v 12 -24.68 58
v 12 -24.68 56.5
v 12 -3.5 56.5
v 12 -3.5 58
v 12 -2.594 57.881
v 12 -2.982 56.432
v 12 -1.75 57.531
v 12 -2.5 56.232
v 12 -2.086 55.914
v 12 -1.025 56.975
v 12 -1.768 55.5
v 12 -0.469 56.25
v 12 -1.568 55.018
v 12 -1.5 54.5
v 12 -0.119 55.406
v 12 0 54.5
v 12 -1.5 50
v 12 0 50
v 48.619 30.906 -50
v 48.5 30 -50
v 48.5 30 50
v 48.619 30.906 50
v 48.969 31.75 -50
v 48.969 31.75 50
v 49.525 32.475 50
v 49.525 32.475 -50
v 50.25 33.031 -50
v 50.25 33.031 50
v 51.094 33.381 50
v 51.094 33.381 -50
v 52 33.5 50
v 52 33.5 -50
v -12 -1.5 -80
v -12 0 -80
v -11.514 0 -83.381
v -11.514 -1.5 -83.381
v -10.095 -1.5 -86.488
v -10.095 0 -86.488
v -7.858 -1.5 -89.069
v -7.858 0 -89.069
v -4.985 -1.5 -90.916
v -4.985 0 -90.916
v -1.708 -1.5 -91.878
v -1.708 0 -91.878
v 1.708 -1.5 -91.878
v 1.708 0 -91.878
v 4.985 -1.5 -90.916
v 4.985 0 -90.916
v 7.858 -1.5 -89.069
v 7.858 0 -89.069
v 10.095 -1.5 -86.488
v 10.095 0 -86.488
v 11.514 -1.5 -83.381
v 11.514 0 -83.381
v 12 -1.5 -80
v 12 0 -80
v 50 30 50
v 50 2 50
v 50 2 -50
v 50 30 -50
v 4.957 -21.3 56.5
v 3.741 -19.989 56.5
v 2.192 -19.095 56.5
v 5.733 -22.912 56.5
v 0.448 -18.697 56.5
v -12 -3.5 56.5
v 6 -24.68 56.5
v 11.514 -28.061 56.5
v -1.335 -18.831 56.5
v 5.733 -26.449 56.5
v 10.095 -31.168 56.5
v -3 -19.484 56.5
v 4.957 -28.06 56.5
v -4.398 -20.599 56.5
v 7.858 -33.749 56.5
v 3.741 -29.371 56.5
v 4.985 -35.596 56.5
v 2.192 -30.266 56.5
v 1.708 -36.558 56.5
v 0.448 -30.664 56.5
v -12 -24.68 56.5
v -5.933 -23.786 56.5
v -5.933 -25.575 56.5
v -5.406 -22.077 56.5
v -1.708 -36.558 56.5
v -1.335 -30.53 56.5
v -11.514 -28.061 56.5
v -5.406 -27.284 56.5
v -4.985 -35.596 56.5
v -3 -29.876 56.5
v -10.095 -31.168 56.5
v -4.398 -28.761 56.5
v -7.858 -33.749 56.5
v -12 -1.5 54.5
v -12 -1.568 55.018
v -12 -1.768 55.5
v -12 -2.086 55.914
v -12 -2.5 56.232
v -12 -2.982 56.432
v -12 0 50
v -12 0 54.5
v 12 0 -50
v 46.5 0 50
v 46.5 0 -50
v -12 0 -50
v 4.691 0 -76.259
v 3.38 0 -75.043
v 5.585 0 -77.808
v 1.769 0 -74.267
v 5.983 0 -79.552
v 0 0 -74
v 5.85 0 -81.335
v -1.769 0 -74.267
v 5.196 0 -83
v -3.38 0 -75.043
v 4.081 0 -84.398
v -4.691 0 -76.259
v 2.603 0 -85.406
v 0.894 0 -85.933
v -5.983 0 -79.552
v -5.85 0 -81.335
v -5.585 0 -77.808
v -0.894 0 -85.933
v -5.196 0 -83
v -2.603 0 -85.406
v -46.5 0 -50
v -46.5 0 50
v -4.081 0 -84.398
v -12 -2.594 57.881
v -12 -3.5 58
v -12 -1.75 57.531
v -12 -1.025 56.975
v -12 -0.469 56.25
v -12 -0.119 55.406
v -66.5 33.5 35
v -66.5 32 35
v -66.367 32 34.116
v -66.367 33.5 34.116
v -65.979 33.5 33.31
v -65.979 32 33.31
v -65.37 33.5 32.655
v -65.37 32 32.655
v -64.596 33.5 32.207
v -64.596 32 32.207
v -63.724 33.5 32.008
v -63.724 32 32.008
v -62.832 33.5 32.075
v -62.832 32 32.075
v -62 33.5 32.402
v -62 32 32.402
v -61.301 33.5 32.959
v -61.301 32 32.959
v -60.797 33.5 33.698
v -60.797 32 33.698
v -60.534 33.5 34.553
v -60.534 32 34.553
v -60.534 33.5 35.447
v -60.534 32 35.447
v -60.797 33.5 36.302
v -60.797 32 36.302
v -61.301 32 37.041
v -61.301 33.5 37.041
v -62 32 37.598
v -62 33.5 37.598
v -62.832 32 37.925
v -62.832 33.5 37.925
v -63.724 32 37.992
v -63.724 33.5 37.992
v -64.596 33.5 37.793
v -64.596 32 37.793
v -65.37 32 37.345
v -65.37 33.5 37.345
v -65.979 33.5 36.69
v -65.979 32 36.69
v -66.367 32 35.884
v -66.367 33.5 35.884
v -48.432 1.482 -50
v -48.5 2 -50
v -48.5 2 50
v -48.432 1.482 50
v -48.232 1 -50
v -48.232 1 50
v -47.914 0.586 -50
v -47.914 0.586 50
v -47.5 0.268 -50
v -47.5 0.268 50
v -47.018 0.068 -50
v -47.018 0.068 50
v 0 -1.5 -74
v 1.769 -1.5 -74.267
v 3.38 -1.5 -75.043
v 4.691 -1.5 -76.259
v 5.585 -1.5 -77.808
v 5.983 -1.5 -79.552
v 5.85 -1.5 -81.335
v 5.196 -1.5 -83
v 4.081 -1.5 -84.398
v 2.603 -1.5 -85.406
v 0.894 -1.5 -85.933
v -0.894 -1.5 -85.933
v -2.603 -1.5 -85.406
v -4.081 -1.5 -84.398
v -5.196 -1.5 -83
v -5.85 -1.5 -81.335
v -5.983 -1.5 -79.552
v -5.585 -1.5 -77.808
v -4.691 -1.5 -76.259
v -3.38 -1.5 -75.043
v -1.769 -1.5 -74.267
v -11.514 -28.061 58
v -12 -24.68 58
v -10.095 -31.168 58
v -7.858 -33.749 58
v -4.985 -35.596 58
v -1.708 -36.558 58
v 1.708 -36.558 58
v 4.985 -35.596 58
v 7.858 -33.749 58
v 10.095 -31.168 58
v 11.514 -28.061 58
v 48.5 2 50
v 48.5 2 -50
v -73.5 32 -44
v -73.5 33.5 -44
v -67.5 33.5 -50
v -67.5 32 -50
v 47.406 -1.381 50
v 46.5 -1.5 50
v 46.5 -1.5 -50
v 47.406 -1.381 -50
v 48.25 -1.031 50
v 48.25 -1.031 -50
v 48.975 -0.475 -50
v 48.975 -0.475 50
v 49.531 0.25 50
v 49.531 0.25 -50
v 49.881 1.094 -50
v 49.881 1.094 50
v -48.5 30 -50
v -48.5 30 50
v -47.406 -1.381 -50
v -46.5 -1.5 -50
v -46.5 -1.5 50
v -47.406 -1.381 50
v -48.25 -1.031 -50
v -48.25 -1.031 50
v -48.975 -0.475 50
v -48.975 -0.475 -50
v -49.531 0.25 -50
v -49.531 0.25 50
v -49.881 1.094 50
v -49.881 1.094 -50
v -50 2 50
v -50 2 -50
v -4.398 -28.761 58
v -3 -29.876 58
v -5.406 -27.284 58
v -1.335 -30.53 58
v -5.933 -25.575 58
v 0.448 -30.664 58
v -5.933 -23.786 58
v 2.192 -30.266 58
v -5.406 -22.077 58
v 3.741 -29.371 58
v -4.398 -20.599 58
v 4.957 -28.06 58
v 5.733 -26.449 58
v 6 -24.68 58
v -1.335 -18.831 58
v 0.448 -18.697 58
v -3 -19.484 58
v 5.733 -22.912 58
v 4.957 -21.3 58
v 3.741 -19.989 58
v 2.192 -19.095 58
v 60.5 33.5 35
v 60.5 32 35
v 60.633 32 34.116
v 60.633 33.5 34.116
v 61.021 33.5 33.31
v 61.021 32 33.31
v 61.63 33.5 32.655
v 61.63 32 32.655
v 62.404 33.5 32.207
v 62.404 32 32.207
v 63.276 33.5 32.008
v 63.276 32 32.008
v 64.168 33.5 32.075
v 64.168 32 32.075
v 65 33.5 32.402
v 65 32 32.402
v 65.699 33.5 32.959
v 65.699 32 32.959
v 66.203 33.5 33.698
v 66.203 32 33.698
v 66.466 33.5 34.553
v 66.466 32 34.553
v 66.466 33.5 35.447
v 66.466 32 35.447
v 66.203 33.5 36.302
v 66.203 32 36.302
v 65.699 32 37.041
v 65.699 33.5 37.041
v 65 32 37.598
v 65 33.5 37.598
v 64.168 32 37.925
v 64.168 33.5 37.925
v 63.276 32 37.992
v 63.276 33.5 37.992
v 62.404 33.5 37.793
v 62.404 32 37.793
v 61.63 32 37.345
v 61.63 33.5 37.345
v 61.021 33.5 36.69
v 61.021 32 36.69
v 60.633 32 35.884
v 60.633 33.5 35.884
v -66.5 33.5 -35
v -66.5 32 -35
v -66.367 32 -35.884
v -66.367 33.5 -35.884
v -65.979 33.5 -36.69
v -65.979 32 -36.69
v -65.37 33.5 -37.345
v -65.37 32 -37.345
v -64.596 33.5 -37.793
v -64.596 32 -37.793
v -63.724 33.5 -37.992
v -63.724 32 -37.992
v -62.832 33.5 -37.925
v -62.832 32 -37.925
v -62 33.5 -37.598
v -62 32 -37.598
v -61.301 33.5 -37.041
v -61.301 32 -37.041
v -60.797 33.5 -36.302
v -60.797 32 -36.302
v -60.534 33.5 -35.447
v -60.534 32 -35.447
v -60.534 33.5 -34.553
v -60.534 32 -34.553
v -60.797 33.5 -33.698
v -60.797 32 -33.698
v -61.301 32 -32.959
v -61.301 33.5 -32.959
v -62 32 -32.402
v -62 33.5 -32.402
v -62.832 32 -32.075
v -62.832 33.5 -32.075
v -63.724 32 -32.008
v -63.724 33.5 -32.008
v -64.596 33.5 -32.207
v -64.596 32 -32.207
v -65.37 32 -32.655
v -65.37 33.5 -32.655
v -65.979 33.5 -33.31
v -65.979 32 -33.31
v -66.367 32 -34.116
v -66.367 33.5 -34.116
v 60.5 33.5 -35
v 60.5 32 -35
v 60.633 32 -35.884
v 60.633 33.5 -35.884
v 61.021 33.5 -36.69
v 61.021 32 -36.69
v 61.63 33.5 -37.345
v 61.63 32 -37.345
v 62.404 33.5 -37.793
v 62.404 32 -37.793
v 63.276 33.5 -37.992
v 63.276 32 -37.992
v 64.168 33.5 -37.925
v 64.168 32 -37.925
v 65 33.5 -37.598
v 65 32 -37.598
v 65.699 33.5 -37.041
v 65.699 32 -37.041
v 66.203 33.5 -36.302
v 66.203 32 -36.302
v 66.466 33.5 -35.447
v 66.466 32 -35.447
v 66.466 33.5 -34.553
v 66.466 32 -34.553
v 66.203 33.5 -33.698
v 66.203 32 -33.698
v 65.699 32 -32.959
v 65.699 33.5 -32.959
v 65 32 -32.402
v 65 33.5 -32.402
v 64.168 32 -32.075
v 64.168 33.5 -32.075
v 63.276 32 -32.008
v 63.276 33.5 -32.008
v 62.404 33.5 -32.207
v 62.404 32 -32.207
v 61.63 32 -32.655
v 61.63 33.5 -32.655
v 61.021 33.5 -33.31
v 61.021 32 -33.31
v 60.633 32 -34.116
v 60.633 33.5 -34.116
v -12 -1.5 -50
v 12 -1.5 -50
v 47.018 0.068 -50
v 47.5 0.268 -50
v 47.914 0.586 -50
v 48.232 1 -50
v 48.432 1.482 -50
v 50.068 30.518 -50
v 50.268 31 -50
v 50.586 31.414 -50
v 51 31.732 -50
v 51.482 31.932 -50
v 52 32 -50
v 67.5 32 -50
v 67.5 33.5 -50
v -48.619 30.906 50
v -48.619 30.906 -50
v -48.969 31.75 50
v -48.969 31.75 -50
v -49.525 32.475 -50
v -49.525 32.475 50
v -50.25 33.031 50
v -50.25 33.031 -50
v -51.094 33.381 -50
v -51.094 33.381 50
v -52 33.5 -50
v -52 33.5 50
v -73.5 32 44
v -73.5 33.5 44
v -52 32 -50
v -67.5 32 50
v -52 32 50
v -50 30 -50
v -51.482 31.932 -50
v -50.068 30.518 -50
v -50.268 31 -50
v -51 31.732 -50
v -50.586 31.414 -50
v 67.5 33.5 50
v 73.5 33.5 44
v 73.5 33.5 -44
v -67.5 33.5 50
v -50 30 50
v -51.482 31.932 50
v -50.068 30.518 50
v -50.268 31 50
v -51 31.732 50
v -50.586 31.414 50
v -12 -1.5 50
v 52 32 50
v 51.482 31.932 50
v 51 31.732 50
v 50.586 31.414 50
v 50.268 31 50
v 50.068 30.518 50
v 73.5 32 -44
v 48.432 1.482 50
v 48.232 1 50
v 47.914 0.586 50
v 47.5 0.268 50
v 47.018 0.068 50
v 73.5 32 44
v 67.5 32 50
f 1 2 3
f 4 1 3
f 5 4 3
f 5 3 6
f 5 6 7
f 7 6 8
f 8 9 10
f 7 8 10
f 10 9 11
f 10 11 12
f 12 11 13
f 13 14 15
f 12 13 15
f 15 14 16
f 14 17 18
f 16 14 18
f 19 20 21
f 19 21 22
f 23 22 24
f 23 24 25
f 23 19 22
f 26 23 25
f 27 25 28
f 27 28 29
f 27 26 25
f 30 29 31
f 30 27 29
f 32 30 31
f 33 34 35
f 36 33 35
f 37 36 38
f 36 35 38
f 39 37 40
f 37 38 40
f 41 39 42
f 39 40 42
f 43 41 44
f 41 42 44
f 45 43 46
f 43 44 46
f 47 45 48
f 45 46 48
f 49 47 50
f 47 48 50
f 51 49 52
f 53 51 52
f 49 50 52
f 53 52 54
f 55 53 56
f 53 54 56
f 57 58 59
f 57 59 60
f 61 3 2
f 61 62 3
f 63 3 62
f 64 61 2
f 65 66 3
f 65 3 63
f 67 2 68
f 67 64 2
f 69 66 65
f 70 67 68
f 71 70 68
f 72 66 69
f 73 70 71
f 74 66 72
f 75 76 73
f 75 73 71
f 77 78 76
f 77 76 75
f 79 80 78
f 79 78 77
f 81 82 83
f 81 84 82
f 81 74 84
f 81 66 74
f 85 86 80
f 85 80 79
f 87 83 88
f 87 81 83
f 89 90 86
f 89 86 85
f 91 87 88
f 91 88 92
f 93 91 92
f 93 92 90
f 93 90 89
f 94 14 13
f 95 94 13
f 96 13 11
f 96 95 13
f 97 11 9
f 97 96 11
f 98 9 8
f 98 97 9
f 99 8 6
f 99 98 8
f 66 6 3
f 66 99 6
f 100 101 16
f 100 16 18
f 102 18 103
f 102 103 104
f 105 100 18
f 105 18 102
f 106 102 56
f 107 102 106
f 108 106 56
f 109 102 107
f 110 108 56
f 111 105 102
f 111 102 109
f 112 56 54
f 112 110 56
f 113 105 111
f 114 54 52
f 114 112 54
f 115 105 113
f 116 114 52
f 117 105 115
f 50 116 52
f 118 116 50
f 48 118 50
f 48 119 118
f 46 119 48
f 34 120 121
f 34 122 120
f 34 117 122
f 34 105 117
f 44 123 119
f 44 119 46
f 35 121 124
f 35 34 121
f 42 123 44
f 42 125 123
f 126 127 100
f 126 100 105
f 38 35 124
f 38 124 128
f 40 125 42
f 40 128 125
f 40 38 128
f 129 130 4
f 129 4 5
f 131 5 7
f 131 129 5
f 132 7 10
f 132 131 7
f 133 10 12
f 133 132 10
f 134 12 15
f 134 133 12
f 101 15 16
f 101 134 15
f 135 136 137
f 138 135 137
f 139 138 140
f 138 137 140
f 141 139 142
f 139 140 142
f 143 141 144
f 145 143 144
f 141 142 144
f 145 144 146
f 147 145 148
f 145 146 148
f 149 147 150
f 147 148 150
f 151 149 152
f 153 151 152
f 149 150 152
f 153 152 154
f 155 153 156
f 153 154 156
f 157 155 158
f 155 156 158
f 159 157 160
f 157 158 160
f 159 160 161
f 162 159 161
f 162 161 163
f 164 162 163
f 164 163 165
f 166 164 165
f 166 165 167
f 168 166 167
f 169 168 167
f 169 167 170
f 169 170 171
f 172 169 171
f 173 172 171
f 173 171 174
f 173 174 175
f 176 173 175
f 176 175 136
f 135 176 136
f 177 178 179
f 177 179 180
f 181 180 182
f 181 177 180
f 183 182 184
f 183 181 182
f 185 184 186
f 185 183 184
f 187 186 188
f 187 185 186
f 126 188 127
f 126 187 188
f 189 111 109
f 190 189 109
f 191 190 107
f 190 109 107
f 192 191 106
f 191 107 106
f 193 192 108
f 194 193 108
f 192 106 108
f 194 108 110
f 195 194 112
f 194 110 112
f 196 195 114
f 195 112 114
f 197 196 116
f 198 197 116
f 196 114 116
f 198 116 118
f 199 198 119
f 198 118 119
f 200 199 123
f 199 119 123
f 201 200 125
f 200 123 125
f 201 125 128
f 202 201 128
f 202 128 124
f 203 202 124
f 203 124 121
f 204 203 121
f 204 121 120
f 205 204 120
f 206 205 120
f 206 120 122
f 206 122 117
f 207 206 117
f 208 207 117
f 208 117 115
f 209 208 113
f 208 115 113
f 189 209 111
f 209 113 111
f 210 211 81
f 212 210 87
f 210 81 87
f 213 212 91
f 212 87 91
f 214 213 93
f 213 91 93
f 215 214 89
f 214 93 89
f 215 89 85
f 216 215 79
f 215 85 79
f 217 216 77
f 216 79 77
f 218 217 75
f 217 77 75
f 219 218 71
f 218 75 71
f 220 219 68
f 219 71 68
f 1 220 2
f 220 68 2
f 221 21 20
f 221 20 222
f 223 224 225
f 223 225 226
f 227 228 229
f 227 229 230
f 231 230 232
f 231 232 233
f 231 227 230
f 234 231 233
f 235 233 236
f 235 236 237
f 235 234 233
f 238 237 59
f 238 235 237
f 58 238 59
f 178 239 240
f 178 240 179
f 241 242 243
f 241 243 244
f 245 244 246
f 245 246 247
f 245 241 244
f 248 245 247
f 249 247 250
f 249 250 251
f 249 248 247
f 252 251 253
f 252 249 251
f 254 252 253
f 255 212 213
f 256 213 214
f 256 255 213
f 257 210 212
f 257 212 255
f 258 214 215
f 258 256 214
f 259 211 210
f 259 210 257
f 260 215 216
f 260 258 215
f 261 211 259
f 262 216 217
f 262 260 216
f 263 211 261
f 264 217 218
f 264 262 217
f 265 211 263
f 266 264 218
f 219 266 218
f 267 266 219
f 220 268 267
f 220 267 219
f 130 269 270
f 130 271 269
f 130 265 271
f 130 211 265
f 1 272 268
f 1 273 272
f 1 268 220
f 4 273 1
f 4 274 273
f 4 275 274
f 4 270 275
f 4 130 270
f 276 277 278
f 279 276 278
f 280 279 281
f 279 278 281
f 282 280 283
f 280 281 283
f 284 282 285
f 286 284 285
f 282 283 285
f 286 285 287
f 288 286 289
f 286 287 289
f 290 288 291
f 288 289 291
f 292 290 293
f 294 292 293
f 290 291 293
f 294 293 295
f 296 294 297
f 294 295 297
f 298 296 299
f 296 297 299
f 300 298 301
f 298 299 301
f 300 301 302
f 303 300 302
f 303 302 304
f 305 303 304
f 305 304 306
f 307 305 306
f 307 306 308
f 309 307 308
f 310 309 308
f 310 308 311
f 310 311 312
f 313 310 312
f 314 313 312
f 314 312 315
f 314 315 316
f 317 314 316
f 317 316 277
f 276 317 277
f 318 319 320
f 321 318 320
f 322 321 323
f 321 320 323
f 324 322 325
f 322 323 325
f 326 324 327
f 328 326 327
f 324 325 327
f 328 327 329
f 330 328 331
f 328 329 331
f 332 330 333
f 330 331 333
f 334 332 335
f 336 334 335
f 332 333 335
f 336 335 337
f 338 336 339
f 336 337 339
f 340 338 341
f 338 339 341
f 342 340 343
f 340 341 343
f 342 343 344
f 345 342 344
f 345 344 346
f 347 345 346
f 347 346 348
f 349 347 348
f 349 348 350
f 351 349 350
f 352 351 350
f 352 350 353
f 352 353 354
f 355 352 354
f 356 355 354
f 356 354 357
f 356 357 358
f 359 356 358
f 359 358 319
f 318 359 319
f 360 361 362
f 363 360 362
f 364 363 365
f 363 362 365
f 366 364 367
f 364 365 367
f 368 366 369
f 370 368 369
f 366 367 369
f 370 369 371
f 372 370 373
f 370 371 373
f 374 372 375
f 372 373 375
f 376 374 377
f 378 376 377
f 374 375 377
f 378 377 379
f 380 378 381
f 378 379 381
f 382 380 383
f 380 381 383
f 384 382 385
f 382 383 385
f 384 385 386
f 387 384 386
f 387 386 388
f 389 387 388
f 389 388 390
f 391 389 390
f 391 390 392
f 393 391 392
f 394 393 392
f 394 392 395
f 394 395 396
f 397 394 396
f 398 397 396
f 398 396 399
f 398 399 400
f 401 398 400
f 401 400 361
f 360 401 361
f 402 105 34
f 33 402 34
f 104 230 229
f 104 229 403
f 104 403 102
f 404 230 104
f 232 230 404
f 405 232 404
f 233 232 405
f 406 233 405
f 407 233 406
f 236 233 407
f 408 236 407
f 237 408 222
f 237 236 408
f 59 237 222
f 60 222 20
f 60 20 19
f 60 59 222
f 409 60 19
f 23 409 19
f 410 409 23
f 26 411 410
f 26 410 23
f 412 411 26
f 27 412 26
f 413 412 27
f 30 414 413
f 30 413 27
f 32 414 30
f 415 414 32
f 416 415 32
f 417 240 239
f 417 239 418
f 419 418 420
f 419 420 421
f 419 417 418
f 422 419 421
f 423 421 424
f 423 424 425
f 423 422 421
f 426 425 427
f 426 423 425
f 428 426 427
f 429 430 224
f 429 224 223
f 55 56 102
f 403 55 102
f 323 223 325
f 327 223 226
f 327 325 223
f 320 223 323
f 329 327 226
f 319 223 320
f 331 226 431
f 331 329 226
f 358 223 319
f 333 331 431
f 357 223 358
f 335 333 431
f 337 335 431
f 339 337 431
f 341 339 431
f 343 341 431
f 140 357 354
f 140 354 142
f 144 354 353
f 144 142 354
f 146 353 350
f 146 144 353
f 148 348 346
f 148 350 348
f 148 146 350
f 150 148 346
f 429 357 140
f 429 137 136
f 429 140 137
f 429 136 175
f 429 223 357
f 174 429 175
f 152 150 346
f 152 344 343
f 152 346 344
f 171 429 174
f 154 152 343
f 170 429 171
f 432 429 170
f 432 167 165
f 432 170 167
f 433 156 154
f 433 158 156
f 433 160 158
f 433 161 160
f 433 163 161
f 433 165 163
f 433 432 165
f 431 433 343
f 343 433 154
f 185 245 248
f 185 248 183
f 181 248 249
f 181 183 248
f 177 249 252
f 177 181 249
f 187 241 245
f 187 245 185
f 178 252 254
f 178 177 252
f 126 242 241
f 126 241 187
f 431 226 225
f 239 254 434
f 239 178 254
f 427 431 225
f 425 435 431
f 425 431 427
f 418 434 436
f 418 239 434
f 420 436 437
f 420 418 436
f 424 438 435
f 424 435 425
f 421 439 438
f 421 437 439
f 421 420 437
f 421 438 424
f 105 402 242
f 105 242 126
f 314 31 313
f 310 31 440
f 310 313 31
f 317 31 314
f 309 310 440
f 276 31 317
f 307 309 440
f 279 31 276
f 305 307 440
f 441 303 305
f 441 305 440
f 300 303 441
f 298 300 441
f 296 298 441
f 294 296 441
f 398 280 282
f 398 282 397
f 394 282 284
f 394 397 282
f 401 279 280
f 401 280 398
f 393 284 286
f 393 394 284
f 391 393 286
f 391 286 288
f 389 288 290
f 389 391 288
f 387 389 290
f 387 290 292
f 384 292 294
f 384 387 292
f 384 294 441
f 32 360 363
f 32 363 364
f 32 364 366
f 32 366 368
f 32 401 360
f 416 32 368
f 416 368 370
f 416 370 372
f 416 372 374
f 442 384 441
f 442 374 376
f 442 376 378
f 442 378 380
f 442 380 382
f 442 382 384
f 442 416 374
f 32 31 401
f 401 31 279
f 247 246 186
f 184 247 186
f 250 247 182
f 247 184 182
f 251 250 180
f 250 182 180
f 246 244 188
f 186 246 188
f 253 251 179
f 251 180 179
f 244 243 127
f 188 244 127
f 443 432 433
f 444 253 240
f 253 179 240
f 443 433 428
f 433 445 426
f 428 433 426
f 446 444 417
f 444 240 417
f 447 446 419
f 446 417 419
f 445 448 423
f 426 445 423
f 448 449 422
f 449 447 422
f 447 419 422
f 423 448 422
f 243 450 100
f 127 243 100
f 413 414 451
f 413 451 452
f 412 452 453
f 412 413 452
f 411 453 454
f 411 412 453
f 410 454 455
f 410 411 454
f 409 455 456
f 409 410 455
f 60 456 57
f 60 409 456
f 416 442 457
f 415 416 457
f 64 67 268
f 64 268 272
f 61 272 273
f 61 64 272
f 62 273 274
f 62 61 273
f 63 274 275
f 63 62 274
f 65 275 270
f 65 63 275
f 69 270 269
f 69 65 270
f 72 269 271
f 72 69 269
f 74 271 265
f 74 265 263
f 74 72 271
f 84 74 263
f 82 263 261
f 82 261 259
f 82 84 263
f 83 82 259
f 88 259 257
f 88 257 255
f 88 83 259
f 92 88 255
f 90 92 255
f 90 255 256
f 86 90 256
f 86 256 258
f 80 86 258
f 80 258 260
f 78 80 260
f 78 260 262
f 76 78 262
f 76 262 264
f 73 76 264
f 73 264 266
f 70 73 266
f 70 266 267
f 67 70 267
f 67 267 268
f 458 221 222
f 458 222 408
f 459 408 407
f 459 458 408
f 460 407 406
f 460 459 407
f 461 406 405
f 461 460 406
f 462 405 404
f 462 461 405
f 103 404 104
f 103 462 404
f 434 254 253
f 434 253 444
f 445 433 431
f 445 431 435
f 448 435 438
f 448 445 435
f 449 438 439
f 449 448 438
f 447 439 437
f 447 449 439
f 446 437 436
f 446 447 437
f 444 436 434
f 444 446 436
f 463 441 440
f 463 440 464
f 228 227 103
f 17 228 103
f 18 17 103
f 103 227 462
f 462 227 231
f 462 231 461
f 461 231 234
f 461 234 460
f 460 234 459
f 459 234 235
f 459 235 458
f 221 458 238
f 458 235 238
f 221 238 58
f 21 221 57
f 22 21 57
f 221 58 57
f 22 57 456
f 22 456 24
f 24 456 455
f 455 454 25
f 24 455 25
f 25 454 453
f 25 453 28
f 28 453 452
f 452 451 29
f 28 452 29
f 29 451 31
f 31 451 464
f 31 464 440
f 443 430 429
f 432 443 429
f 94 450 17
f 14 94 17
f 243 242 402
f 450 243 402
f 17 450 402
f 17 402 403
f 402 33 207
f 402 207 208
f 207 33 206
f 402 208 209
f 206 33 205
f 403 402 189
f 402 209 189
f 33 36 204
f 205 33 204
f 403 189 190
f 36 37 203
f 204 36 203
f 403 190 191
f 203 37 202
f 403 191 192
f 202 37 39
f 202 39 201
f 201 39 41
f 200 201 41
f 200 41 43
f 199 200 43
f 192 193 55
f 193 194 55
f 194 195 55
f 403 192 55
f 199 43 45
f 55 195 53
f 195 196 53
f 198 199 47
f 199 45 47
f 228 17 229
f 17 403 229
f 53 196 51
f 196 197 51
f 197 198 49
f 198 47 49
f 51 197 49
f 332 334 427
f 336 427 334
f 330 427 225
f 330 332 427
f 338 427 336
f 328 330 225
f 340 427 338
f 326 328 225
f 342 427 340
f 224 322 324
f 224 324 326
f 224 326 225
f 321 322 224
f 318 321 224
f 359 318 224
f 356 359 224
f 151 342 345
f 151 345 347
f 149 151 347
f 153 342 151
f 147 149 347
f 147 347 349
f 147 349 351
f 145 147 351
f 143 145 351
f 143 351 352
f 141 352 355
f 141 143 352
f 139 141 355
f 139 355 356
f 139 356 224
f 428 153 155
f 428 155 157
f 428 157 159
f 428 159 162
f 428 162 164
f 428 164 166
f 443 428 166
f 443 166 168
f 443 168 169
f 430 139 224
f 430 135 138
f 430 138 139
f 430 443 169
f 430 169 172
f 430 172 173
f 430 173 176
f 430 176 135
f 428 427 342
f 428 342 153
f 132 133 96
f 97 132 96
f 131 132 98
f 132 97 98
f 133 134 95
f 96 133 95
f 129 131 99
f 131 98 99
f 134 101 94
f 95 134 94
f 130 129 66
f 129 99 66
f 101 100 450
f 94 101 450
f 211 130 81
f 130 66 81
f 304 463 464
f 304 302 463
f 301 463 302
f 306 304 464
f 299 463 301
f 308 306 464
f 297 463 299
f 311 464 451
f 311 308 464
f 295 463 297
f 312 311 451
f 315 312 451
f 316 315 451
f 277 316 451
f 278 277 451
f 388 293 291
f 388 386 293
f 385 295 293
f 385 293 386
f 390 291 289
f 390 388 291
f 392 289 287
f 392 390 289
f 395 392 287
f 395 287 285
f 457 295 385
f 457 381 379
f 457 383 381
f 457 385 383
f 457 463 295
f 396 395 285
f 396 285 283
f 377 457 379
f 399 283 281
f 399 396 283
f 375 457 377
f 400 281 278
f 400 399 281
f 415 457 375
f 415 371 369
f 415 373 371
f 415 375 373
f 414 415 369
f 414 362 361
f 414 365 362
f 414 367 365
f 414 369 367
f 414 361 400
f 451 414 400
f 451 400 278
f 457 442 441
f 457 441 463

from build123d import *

# Parameters (mm, degrees)
SKETCH1_W                      = 100
SKETCH1_H                      = 100
BASE_FLANGE1_DEPTH             = 1.5
EDGE_FLANGE1_STRIP_W           = 10
EDGE_FLANGE1_STRIP_H           = 1.5
EDGE_FLANGE1_STRIP_CUT_DEPTH   = 100
EDGE_FLANGE1_STRIP_2_W         = 10
EDGE_FLANGE1_STRIP_2_H         = 1.5
EDGE_FLANGE1_STRIP_CUT_2_DEPTH = 100
EDGE_FLANGE1_DEPTH             = 100
EDGE_FLANGE1_BEND_DEPTH        = 100
EDGE_FLANGE2_STRIP_W           = 10
EDGE_FLANGE2_STRIP_H           = 1.5
EDGE_FLANGE2_STRIP_CUT_DEPTH   = 100
EDGE_FLANGE2_STRIP_2_W         = 10
EDGE_FLANGE2_STRIP_2_H         = 1.5
EDGE_FLANGE2_STRIP_CUT_2_DEPTH = 100
EDGE_FLANGE2_DEPTH             = 100
EDGE_FLANGE2_BEND_DEPTH        = 100
F_6_0_6_DIAMETER_HOLE1_D       = 6
CHAMFER1_SIZE                  = 6
SKETCH20_R                     = 6
BOSS_EXTRUDE1_DEPTH            = 1.5
SKETCHED_START                 = 57.64041
SKETCHED_BEND1_OUTLINE_W       = 24
SKETCHED_BEND1_OUTLINE_H       = 1.5
SKETCHED_BEND1_DEPTH           = 35.35959
SKETCHED_START_2               = 54.5
SKETCHED_BEND1_2_OUTLINE_R     = 6
SKETCHED_BEND1_2_DEPTH         = 3.5
SKETCHED_START_3               = -12
SKETCHED_BEND1_3_DEPTH         = 24


with BuildPart() as part:
    # Base-Flange1: sheet metal written as solids
    # Sketch1 → Base-Flange1 (new body)
    with BuildSketch(Plane(origin=(0, 0, 0), x_dir=(1, 0, 0), z_dir=(0, 1, 0))):
        Rectangle(SKETCH1_W, SKETCH1_H)
    extrude(amount=-BASE_FLANGE1_DEPTH)

    # Edge-Flange1: sheet metal written as solids
    # Edge-Flange1 strip (on a plane across the edge) → Edge-Flange1 strip cut (cut)
    with BuildSketch(Plane(origin=(-50, 0, -50), x_dir=(1, 0, 0), z_dir=(0, 0, 1))):
        with Locations((-1.5, -0.75)):
            Rectangle(EDGE_FLANGE1_STRIP_W, EDGE_FLANGE1_STRIP_H)
    extrude(amount=EDGE_FLANGE1_STRIP_CUT_DEPTH, mode=Mode.SUBTRACT)

    # Edge-Flange1 strip 2 (on a plane across the edge) → Edge-Flange1 strip cut 2 (cut)
    with BuildSketch(Plane(origin=(50, 0, 50), x_dir=(-1, 0, 0), z_dir=(0, 0, -1))):
        with Locations((-1.5, -0.75)):
            Rectangle(EDGE_FLANGE1_STRIP_2_W, EDGE_FLANGE1_STRIP_2_H)
    extrude(amount=EDGE_FLANGE1_STRIP_CUT_2_DEPTH, mode=Mode.SUBTRACT)

    # Edge-Flange1 section (on a plane across the edge) → Edge-Flange1 (add)
    with BuildSketch(Plane(origin=(-50, 0, -50), x_dir=(1, 0, 0), z_dir=(0, 0, 1))):
        with BuildLine():
            Line((0, 2), (0, 33.5))
            Line((0, 33.5), (1.5, 33.5))
            Line((1.5, 33.5), (1.5, 2))
            ThreePointArc((1.5, 2), (2.085786438, 0.585786438), (3.5, 0))
            Line((3.5, 0), (3.5, -1.5))
            ThreePointArc((3.5, -1.5), (1.025126266, -0.474873734), (0, 2))
        make_face()
    extrude(amount=EDGE_FLANGE1_DEPTH)

    # Edge-Flange1 section 2 (on a plane across the edge) → Edge-Flange1 bend (add)
    with BuildSketch(Plane(origin=(50, 0, 50), x_dir=(-1, 0, 0), z_dir=(0, 0, -1))):
        with BuildLine():
            Line((0, 2), (0, 33.5))
            Line((0, 33.5), (1.5, 33.5))
            Line((1.5, 33.5), (1.5, 2))
            ThreePointArc((1.5, 2), (2.085786438, 0.585786438), (3.5, 0))
            Line((3.5, 0), (3.5, -1.5))
            ThreePointArc((3.5, -1.5), (1.025126266, -0.474873734), (0, 2))
        make_face()
    extrude(amount=EDGE_FLANGE1_BEND_DEPTH)

    # Edge-Flange2: sheet metal written as solids
    # Edge-Flange2 strip (on a plane across the edge) → Edge-Flange2 strip cut (cut)
    with BuildSketch(Plane(origin=(-50, 33.5, 50), x_dir=(0, -1, 0), z_dir=(0, 0, -1))):
        with Locations((-1.5, -0.75)):
            Rectangle(EDGE_FLANGE2_STRIP_W, EDGE_FLANGE2_STRIP_H)
    extrude(amount=EDGE_FLANGE2_STRIP_CUT_DEPTH, mode=Mode.SUBTRACT)

    # Edge-Flange2 strip 2 (on a plane across the edge) → Edge-Flange2 strip cut 2 (cut)
    with BuildSketch(Plane(origin=(50, 33.5, -50), x_dir=(0, -1, 0), z_dir=(0, 0, 1))):
        with Locations((-1.5, -0.75)):
            Rectangle(EDGE_FLANGE2_STRIP_2_W, EDGE_FLANGE2_STRIP_2_H)
    extrude(amount=EDGE_FLANGE2_STRIP_CUT_2_DEPTH, mode=Mode.SUBTRACT)

    # Edge-Flange2 section (on a plane across the edge) → Edge-Flange2 (add)
    with BuildSketch(Plane(origin=(-50, 33.5, 50), x_dir=(0, -1, 0), z_dir=(0, 0, -1))):
        with BuildLine():
            Line((0, 2), (0, 23.5))
            Line((0, 23.5), (1.5, 23.5))
            Line((1.5, 23.5), (1.5, 2))
            ThreePointArc((1.5, 2), (2.085786438, 0.585786438), (3.5, 0))
            Line((3.5, 0), (3.5, -1.5))
            ThreePointArc((3.5, -1.5), (1.025126266, -0.474873734), (0, 2))
        make_face()
    extrude(amount=EDGE_FLANGE2_DEPTH)

    # Edge-Flange2 section 2 (on a plane across the edge) → Edge-Flange2 bend (add)
    with BuildSketch(Plane(origin=(50, 33.5, -50), x_dir=(0, -1, 0), z_dir=(0, 0, 1))):
        with BuildLine():
            Line((0, 2), (0, 23.5))
            Line((0, 23.5), (1.5, 23.5))
            Line((1.5, 23.5), (1.5, 2))
            ThreePointArc((1.5, 2), (2.085786438, 0.585786438), (3.5, 0))
            Line((3.5, 0), (3.5, -1.5))
            ThreePointArc((3.5, -1.5), (1.025126266, -0.474873734), (0, 2))
        make_face()
    extrude(amount=EDGE_FLANGE2_BEND_DEPTH)

    # Ø6.0 (6) Diameter Hole1 (through all)
    with Locations(Plane(origin=(0, 33.5, 0), x_dir=(1, 0, 0), z_dir=(0, 1, 0))):
        with Locations((-63.5, 35), (-63.5, -35), (63.5, 35), (63.5, -35)):
            Hole(F_6_0_6_DIAMETER_HOLE1_D / 2)

    # Chamfer1
    chamfer1_edges = [part.edges().sort_by_distance(p)[0] for p in [
        (-73.5, 32.75, 50),
        (-73.5, 32.75, -50),
        (73.5, 32.75, -50),
        (73.5, 32.75, 50),
    ]]
    chamfer(chamfer1_edges, length=CHAMFER1_SIZE)

    # Sketch20 → Boss-Extrude1 (add)
    # profile 1 of 2: a face of its own
    with BuildSketch(Plane(origin=(0, 0, 0), x_dir=(1, 0, 0), z_dir=(0, 1, 0))):
        with BuildLine():
            Line((-12, 50), (-12, 80))
            ThreePointArc((-12, 80), (0, 92), (12, 80))
            Line((12, 80), (12, 50))
            Line((12, 50), (-12, 50))
        make_face()
        with Locations(Location((0, 80, 0), (0, 0, 270))):
            Circle(SKETCH20_R, mode=Mode.SUBTRACT)
    # profile 2 of 2: a face of its own
    with BuildSketch(Plane(origin=(0, 0, 0), x_dir=(1, 0, 0), z_dir=(0, 1, 0))):
        with BuildLine():
            Line((12, -50), (-12, -50))
            Line((-12, -50), (-12, -80))
            ThreePointArc((-12, -80), (0, -92), (12, -80))
            Line((12, -80), (12, -50))
        make_face()
        with Locations(Location((0, -80, 0), (0, 0, 90))):
            Circle(SKETCH20_R, mode=Mode.SUBTRACT)
    extrude(amount=-BOSS_EXTRUDE1_DEPTH)

    # Sketched Bend1: read off the stored shape, not the designer's step
    # Sketched Bend1 outline → Sketched Bend1 (cut)
    with BuildSketch(Plane.XY.offset(SKETCHED_START)):
        with Locations((0, -0.75)):
            Rectangle(SKETCHED_BEND1_OUTLINE_W, SKETCHED_BEND1_OUTLINE_H)
    extrude(amount=SKETCHED_BEND1_DEPTH, mode=Mode.SUBTRACT)

    # Sketched Bend1 2 outline → Sketched Bend1 2 (add)
    with BuildSketch(Plane.XY.offset(SKETCHED_START_2)):
        with BuildLine():
            Line((-12, -1.5), (-12, -24.680310101))
            ThreePointArc((-12, -24.680310101), (0, -36.680310101), (12, -24.680310101))
            Line((12, -24.680310101), (12, -1.5))
            Line((12, -1.5), (-12, -1.5))
        make_face()
        with Locations((0, -24.680310101)):
            Circle(SKETCHED_BEND1_2_OUTLINE_R, mode=Mode.SUBTRACT)
    extrude(amount=SKETCHED_BEND1_2_DEPTH)

    # Sketched Bend1 3 outline → Sketched Bend1 3 (cut)
    with BuildSketch(Plane.YZ.offset(SKETCHED_START_3)):
        with BuildLine():
            ThreePointArc((-1.5, 54.5), (-2.085786438, 55.914213562), (-3.5, 56.5))
            Line((-3.5, 56.5), (-38, 56.5))
            Line((-38, 56.5), (-38, 54.5))
            Line((-38, 54.5), (-1.5, 54.5))
        make_face()
        with BuildLine():
            Line((-38, 59), (-38, 58.000000005))
            Line((-38, 58.000000005), (-3.5, 58))
            ThreePointArc((-3.5, 58), (-1.025126266, 56.974873734), (0, 54.5))
            Line((0, 54.5), (0, 53))
            Line((0, 53), (1, 53))
            Line((1, 53), (1, 57.64041))
            Line((1, 57.64041), (-1.5, 57.64041))
            Line((-1.5, 57.64041), (-1.5, 59))
            Line((-1.5, 59), (-38, 59))
        make_face()
    extrude(amount=SKETCHED_BEND1_3_DEPTH, mode=Mode.SUBTRACT)


solid = part.part
